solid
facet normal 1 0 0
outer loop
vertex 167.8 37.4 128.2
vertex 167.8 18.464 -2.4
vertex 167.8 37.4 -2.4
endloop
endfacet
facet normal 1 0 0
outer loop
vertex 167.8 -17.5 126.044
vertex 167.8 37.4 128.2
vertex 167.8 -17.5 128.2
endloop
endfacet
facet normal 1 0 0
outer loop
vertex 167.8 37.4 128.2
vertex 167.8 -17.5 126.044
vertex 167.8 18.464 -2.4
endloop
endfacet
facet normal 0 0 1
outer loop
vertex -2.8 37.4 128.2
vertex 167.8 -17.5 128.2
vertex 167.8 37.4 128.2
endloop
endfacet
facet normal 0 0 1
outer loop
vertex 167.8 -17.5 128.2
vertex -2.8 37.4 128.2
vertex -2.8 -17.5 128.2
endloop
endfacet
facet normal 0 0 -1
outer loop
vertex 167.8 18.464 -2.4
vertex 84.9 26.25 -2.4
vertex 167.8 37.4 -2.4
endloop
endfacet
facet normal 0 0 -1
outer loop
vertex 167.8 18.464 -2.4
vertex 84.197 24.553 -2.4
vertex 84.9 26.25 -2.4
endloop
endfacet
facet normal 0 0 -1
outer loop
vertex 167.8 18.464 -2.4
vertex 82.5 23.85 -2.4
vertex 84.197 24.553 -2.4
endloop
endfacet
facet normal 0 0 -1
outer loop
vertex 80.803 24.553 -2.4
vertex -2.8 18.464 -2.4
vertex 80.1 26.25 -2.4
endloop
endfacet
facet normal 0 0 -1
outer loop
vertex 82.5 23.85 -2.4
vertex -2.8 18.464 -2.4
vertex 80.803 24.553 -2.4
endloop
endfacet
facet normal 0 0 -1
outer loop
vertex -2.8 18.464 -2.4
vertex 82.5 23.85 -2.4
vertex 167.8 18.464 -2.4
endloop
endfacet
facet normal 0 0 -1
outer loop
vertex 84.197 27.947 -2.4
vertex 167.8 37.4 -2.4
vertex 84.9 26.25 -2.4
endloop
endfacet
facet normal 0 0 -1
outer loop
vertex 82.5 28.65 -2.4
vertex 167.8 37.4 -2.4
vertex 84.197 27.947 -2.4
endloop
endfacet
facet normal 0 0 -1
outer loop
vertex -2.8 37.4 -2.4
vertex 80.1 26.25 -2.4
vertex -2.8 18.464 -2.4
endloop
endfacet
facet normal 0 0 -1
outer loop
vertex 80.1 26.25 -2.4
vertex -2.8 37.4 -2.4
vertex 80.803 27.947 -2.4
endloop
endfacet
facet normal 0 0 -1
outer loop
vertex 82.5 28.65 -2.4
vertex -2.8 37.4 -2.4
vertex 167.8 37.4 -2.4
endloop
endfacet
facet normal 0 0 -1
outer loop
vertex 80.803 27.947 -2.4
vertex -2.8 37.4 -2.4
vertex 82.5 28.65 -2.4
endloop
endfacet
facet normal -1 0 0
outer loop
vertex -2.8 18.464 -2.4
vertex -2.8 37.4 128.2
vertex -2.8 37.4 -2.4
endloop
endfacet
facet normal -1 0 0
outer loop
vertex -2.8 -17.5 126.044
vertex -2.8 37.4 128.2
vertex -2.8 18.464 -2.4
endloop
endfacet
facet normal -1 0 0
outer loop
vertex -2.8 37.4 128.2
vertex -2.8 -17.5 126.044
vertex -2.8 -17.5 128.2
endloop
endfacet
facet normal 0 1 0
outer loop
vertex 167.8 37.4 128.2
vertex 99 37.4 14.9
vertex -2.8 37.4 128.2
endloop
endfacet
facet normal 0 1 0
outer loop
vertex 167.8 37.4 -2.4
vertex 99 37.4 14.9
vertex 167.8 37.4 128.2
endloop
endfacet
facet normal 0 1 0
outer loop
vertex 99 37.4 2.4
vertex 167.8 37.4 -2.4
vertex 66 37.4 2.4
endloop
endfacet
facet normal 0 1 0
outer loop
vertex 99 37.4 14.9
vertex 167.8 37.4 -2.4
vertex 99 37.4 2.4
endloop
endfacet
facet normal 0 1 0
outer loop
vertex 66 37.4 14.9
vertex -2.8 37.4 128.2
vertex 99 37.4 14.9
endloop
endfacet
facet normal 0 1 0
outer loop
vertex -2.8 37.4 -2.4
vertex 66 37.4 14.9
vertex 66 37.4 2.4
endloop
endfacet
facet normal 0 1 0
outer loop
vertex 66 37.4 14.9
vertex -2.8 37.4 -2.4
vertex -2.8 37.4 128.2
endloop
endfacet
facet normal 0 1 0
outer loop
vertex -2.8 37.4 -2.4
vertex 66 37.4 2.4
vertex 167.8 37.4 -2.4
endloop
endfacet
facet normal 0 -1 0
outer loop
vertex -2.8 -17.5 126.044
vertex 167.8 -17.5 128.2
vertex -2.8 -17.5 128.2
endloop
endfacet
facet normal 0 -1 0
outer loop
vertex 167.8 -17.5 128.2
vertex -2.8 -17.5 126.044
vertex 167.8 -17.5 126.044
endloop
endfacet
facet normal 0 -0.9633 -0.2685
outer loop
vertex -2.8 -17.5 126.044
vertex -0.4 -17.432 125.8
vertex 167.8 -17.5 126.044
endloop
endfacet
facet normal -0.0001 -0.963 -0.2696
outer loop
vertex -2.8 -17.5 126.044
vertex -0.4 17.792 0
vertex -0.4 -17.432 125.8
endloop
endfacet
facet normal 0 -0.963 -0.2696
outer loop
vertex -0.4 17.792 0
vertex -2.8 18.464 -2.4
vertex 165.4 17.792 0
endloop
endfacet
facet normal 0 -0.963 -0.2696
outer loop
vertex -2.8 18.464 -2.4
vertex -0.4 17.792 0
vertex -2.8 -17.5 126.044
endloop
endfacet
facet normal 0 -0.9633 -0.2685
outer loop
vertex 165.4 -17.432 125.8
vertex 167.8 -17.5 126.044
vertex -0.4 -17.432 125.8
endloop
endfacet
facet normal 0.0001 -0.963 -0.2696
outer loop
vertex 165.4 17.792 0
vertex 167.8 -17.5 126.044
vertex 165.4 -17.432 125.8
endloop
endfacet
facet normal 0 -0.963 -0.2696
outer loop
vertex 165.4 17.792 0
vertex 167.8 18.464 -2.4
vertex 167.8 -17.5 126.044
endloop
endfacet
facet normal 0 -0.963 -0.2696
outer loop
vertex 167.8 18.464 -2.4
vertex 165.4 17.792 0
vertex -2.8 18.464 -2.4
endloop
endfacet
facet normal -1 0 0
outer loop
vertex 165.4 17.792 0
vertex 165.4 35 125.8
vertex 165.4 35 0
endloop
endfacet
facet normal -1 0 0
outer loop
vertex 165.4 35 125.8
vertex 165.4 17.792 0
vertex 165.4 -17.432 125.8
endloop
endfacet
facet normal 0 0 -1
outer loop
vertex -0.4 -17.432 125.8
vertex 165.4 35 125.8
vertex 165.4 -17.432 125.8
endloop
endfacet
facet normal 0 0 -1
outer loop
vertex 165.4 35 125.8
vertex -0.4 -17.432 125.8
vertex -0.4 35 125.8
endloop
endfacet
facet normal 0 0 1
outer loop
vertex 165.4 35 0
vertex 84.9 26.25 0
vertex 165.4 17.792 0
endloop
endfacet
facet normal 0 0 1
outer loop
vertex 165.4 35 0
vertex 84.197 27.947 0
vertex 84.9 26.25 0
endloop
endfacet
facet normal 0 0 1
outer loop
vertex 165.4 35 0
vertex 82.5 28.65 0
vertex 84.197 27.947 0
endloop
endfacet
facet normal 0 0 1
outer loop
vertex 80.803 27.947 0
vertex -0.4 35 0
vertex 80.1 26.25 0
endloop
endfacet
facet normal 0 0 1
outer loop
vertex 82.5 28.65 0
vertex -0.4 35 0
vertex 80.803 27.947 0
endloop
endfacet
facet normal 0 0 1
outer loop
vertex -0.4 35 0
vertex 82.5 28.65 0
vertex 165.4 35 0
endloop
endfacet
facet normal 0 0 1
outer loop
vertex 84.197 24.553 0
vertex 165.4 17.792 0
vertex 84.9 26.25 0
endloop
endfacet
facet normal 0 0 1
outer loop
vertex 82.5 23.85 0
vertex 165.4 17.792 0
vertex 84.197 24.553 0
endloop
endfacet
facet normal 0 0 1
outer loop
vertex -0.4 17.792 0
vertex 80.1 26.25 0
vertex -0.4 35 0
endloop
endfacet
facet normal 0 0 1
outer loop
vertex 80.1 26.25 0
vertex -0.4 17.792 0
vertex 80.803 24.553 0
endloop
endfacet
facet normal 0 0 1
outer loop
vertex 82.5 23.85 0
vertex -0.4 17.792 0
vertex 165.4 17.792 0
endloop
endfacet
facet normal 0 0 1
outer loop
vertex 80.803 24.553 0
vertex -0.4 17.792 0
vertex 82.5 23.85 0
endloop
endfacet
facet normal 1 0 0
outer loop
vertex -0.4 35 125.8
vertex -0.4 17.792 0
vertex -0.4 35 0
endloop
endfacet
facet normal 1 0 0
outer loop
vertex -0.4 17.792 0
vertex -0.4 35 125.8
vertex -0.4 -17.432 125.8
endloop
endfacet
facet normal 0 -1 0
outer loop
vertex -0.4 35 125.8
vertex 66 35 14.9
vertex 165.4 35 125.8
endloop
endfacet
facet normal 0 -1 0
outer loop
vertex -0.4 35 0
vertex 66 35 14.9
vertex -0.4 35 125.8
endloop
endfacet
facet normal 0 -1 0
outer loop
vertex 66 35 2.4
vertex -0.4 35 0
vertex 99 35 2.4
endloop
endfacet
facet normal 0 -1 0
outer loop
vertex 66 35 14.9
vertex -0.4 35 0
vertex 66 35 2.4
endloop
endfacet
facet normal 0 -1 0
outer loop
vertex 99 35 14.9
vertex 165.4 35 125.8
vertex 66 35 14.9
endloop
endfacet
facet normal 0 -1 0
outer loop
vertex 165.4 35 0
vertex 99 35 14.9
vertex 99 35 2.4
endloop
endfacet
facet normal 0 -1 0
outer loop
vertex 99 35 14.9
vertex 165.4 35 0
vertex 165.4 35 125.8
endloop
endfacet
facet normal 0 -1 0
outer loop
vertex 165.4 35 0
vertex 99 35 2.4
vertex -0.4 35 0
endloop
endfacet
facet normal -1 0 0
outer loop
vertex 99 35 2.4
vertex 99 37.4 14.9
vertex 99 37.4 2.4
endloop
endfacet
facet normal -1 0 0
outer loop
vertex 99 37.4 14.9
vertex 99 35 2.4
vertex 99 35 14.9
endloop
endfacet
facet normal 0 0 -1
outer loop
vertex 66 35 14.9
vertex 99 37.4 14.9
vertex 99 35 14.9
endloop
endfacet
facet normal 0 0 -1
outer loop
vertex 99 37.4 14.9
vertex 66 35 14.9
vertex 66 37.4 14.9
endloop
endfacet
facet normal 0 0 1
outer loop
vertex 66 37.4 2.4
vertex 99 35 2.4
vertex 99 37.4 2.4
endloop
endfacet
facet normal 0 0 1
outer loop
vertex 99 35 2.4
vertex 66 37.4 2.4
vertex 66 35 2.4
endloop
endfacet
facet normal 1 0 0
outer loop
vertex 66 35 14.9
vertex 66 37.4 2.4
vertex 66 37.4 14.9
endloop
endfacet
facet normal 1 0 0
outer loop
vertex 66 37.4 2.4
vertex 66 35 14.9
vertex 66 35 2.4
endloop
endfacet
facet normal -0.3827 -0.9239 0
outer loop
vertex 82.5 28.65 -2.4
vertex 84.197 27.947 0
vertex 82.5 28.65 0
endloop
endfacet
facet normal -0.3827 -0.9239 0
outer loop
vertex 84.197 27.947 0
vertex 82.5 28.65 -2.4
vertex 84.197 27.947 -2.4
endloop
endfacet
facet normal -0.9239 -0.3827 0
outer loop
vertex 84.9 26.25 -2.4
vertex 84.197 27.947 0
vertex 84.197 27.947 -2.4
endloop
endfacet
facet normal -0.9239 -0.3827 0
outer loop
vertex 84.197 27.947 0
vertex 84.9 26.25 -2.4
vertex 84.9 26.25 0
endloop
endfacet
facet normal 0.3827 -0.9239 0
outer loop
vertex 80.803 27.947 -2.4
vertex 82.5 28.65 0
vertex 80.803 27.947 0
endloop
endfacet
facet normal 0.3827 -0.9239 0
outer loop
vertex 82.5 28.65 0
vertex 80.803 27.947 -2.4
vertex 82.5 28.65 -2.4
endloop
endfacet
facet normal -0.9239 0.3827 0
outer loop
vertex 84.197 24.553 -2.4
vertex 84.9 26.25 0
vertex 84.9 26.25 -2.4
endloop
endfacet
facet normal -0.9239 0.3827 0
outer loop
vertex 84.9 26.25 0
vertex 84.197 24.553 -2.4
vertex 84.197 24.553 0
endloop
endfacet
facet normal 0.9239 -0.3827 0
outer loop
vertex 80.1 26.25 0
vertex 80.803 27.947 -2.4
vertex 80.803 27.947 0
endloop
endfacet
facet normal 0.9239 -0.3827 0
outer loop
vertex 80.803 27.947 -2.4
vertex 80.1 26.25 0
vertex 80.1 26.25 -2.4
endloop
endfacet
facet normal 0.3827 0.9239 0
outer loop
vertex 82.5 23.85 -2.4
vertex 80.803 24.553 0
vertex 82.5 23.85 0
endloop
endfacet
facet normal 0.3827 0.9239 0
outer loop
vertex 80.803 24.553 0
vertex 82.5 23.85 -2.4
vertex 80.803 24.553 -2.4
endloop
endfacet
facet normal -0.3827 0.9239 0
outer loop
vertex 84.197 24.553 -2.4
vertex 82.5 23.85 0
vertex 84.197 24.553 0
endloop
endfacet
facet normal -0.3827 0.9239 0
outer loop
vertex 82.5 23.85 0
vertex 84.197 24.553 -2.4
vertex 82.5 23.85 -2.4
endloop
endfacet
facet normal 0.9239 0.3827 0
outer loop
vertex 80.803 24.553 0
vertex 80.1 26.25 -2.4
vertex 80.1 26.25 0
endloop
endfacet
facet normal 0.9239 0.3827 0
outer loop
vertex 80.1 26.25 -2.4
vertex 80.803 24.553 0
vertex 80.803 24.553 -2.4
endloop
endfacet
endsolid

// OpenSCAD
// file: variables.scad
// Size are in millimeters
height = 135;   // z axis
width = 94;     // x axis
deph = 38;      // y axis
thickness = 2.4;
cam_diameter = 15;
button_diameter = 24.2;
speaker_diameter = 28;
micro_diameter = 6;
margin = 0.4;
name = "DOORBELL";

// Only for client
client_height = 125;   // z axis
client_width = 165;     // x axis
client_deph = 35;      // y axis
screen_width = 118;
screen_height = 70.5;   // Diff 5.5mm from pcb top to screen top
screen_pcb_height = 78;
// main file
include <variables.scad>;

// Back
difference () {
    translate ([-margin - thickness, - 0.5*client_deph, - thickness]) 
        cube ([client_width + 2*margin + 2*thickness, 1.5*client_deph + thickness, client_height + 2*margin + 2*thickness]);
    // Cut cube
    translate([-0.5*client_width, -client_deph-thickness ,-0.5*client_height])
        rotate([atan(client_deph/client_height),0,0])
        cube ([2*client_width, 2*client_deph, 2*client_height]);    
    // Remove place for face
    translate ([-margin, -client_deph, 0]) cube ([client_width+2*margin, 2*client_deph, client_height + 2*margin]);
    // Hole for wires
    translate ([0.4 * client_width, client_deph-0.5*thickness, thickness])
        cube ([0.2 * client_width, 2*thickness, 0.1 * client_height]);
    // Screw hole
    translate ([0.5 * client_width, 0.75 * client_deph, -thickness-margin])
        cylinder (h = 2*thickness, r = thickness);
};
